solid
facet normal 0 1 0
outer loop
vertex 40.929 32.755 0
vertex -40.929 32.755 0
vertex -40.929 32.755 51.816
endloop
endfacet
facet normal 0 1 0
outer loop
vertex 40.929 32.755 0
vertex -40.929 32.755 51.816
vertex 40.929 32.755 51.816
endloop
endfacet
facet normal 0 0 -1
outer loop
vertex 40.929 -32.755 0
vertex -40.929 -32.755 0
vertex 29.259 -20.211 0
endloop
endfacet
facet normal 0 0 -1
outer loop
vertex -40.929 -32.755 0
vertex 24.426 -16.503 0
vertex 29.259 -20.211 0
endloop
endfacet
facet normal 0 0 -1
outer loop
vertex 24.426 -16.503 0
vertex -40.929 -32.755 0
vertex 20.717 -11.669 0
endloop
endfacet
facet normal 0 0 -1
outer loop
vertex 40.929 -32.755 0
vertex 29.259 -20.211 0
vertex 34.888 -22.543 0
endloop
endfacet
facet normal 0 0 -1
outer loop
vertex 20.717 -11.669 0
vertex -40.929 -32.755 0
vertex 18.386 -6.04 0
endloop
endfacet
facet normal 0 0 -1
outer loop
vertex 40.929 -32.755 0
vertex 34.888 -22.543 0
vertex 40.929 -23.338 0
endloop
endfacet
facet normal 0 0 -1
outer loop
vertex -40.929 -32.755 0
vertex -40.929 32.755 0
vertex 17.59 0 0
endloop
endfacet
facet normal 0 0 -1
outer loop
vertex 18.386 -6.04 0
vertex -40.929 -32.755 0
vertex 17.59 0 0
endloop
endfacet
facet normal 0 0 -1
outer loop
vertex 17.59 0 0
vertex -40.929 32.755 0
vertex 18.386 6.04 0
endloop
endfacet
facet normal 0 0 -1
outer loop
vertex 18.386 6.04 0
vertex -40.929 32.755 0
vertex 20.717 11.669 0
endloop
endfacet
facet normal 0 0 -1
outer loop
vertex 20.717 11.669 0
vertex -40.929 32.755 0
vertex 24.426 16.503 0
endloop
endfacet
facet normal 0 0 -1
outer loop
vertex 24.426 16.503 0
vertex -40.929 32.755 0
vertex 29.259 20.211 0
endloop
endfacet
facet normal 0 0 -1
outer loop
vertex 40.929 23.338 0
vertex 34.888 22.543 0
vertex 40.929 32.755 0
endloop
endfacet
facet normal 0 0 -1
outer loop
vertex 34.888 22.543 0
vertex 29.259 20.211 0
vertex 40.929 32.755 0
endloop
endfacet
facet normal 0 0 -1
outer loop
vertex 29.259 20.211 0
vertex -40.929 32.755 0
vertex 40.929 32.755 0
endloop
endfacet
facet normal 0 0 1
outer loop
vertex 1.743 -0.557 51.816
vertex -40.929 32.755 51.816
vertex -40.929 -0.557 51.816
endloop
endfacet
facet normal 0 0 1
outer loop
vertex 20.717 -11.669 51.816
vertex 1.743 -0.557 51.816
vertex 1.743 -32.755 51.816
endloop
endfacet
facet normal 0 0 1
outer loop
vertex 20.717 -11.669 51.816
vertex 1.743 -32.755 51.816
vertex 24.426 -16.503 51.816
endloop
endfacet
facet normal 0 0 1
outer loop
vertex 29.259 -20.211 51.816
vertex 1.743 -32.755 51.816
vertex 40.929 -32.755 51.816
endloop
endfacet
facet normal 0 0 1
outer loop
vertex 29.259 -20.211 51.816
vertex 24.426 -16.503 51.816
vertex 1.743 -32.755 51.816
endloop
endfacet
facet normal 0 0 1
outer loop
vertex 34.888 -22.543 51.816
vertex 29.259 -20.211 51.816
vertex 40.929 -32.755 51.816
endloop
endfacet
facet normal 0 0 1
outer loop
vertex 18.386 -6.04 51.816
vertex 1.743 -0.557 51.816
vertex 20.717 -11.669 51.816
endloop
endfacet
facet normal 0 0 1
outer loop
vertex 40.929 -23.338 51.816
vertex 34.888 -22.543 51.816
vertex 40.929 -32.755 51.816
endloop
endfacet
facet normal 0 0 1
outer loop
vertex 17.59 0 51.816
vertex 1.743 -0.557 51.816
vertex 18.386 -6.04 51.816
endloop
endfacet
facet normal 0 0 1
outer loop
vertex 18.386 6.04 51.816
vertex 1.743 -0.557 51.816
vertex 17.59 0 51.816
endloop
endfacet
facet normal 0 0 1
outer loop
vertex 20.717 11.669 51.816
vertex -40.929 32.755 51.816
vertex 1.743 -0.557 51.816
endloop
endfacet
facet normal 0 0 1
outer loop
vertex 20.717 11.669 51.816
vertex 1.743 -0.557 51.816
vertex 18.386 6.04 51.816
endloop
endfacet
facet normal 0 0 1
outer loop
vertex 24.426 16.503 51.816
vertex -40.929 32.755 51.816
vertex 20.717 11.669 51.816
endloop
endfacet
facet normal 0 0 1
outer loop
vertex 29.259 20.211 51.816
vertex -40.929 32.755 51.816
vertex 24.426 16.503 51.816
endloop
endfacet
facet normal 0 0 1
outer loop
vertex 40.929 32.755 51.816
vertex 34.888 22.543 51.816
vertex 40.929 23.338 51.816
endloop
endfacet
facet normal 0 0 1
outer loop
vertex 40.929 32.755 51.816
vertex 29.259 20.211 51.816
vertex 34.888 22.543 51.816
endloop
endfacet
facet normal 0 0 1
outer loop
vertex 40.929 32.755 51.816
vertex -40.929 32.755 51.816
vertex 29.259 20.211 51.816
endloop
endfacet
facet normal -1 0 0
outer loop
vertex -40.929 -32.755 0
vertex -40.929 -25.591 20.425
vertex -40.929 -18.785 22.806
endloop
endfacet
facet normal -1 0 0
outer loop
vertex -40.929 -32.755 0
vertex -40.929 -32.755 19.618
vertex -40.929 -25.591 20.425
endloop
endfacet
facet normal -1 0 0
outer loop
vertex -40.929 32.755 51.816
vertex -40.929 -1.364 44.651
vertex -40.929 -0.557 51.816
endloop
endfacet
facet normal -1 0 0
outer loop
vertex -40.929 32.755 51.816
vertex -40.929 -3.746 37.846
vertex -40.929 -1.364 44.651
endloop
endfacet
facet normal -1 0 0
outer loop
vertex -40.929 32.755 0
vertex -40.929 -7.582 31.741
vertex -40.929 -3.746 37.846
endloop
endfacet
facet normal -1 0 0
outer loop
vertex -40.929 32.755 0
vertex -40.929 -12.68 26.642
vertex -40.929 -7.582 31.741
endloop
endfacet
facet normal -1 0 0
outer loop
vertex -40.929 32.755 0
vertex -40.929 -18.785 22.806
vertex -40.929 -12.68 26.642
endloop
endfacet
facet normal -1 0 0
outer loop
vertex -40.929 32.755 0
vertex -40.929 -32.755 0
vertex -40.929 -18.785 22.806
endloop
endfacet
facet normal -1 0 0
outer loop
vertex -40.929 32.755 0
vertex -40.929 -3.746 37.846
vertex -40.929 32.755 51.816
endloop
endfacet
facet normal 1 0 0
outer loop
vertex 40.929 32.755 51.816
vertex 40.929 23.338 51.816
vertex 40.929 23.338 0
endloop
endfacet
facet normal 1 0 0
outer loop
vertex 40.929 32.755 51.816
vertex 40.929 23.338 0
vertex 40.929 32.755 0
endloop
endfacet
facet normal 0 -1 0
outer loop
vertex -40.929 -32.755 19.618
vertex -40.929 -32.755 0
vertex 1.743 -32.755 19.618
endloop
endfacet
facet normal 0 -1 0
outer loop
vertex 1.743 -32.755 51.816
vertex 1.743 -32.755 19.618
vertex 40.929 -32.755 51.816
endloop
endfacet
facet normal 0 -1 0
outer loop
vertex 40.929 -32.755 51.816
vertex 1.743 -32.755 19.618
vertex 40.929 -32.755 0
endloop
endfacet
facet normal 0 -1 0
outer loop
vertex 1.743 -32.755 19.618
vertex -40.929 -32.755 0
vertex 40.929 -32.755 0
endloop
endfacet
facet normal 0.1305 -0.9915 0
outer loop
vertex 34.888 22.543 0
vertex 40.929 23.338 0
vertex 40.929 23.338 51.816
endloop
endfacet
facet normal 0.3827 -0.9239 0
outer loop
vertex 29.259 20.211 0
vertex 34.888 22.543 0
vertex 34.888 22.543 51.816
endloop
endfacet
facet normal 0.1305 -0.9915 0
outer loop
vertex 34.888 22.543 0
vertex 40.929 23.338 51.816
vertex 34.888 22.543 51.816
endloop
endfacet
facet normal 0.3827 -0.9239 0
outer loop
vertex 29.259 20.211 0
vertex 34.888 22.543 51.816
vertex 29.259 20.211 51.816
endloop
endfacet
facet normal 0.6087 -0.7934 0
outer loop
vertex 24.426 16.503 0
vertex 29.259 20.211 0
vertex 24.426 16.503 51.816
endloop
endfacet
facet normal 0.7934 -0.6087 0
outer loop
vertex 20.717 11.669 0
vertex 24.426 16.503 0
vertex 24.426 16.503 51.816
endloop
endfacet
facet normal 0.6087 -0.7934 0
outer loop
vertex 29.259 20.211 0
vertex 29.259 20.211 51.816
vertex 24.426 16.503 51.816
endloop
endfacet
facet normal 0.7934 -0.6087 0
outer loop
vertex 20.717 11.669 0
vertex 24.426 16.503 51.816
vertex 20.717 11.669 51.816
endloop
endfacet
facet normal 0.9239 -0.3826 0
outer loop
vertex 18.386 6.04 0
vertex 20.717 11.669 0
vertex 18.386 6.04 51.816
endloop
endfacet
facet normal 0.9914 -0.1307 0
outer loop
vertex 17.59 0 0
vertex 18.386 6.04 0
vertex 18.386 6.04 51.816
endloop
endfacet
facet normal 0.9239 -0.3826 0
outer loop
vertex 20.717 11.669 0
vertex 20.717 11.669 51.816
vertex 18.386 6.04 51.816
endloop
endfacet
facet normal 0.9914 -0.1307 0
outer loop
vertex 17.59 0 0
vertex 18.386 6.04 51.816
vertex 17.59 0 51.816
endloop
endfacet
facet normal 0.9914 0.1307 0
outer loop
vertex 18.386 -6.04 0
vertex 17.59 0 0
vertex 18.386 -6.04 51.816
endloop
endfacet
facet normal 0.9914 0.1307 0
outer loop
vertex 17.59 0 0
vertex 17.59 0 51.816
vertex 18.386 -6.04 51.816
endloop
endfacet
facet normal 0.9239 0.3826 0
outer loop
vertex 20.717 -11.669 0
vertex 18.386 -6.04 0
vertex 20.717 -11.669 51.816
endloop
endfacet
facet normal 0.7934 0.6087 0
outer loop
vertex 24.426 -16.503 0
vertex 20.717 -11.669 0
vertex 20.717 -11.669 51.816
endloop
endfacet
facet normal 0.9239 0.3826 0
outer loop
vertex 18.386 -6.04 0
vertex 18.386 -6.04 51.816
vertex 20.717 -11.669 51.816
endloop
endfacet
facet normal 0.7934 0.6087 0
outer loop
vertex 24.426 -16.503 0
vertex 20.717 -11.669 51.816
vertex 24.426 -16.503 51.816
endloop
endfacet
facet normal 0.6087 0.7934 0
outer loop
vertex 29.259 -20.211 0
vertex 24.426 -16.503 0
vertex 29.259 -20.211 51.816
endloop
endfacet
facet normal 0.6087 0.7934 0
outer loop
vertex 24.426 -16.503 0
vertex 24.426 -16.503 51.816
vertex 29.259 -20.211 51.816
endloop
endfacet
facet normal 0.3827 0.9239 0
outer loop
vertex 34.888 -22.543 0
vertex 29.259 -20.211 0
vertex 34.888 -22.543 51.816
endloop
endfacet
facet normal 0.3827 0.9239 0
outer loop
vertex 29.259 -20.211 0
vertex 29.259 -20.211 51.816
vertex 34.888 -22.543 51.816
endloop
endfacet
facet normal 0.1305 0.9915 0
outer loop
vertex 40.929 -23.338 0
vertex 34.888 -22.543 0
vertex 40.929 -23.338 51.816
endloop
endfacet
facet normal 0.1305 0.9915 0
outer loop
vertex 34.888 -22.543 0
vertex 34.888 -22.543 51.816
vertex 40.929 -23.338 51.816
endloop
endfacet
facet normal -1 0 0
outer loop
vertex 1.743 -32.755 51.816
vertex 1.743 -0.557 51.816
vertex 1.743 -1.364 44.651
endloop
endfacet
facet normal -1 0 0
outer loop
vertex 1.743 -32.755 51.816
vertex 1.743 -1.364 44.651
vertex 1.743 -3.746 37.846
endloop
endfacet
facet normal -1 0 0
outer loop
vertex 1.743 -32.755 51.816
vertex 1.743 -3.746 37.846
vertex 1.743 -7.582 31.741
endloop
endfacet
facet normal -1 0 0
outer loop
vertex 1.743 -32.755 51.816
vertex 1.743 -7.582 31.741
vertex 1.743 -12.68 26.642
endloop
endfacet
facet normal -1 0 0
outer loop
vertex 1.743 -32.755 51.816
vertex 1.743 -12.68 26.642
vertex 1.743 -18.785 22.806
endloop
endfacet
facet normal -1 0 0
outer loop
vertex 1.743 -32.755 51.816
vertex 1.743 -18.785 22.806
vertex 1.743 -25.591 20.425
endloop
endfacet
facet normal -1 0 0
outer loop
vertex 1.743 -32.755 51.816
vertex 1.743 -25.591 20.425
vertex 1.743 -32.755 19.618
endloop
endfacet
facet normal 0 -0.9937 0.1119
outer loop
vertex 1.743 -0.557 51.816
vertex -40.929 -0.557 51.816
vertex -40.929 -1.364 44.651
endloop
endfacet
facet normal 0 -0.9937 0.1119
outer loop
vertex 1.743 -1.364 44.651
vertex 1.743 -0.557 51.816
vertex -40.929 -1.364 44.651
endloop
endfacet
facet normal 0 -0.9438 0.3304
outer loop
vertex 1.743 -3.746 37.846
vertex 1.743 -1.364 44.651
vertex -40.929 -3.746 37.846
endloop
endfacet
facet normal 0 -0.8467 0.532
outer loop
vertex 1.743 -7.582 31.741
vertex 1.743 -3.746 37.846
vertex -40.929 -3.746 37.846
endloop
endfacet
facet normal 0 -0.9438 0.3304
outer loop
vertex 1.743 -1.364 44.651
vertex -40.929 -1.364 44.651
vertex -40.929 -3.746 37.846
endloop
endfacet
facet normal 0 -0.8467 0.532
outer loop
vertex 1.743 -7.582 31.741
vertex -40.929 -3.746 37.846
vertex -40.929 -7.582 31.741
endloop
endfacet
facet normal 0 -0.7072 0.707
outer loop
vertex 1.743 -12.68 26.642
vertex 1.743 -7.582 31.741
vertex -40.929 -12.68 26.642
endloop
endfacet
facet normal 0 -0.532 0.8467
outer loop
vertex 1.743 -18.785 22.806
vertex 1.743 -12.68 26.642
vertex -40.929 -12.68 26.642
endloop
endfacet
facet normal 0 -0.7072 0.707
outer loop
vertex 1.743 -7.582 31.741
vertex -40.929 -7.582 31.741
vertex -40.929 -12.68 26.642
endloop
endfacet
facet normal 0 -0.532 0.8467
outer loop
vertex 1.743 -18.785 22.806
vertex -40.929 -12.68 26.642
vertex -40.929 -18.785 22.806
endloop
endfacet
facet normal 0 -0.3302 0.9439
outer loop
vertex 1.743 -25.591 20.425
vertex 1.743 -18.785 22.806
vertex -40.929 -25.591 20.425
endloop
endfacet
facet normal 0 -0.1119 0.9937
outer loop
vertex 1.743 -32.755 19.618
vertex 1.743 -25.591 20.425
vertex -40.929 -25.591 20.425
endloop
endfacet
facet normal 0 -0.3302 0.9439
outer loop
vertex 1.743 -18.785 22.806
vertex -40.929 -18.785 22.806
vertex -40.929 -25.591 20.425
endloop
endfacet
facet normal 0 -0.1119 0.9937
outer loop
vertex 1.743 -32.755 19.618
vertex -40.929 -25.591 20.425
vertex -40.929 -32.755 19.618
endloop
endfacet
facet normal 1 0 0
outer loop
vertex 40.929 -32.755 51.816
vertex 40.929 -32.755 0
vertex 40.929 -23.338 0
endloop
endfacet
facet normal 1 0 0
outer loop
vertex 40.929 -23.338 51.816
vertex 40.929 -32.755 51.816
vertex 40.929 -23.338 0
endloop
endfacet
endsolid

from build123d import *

# Parameters (mm, degrees)
F0_W     = 81.85713
F0_H     = 65.510846
F1_DEPTH = 51.816
F3_DEPTH = 78.994
F5_DEPTH = 42.672


with BuildPart() as f1:
    # F0 (on Top) → F1 (new body)
    with BuildSketch(Plane.XY):
        Rectangle(F0_W, F0_H)
    extrude(amount=F1_DEPTH)

    # F2 (on face) → F3 (cut)
    with BuildSketch(Plane.XY.offset(51.816)):
        with BuildLine():
            Line((40.928565, -23.338192), (40.928565, 23.338192))
            ThreePointArc((40.928565, 23.338192), (17.590373, 0), (40.928565, -23.338192))
        make_face()
    extrude(amount=-F3_DEPTH, mode=Mode.SUBTRACT)

    # F4 (on face) → F5 (cut)
    with BuildSketch(Plane(origin=(-40.928565, 0, 0), x_dir=(0, -1, 0), z_dir=(-1, 0, 0))):
        with BuildLine():
            Line((32.755423, 51.816), (0.557004, 51.816))
            ThreePointArc((0.557004, 51.816), (9.987702, 29.048279), (32.755423, 19.61758))
            Line((32.755423, 19.61758), (32.755423, 51.816))
        make_face()
        with BuildLine():
            ThreePointArc((32.755423, 19.61758), (55.523144, 29.048279), (64.953843, 51.816))
            ThreePointArc((64.953843, 51.816), (32.755423, 84.01442), (0.557004, 51.816))
            Line((0.557004, 51.816), (32.755423, 51.816))
            Line((32.755423, 51.816), (32.755423, 19.61758))
        make_face()
    extrude(amount=-F5_DEPTH, mode=Mode.SUBTRACT)


solid = f1.part
